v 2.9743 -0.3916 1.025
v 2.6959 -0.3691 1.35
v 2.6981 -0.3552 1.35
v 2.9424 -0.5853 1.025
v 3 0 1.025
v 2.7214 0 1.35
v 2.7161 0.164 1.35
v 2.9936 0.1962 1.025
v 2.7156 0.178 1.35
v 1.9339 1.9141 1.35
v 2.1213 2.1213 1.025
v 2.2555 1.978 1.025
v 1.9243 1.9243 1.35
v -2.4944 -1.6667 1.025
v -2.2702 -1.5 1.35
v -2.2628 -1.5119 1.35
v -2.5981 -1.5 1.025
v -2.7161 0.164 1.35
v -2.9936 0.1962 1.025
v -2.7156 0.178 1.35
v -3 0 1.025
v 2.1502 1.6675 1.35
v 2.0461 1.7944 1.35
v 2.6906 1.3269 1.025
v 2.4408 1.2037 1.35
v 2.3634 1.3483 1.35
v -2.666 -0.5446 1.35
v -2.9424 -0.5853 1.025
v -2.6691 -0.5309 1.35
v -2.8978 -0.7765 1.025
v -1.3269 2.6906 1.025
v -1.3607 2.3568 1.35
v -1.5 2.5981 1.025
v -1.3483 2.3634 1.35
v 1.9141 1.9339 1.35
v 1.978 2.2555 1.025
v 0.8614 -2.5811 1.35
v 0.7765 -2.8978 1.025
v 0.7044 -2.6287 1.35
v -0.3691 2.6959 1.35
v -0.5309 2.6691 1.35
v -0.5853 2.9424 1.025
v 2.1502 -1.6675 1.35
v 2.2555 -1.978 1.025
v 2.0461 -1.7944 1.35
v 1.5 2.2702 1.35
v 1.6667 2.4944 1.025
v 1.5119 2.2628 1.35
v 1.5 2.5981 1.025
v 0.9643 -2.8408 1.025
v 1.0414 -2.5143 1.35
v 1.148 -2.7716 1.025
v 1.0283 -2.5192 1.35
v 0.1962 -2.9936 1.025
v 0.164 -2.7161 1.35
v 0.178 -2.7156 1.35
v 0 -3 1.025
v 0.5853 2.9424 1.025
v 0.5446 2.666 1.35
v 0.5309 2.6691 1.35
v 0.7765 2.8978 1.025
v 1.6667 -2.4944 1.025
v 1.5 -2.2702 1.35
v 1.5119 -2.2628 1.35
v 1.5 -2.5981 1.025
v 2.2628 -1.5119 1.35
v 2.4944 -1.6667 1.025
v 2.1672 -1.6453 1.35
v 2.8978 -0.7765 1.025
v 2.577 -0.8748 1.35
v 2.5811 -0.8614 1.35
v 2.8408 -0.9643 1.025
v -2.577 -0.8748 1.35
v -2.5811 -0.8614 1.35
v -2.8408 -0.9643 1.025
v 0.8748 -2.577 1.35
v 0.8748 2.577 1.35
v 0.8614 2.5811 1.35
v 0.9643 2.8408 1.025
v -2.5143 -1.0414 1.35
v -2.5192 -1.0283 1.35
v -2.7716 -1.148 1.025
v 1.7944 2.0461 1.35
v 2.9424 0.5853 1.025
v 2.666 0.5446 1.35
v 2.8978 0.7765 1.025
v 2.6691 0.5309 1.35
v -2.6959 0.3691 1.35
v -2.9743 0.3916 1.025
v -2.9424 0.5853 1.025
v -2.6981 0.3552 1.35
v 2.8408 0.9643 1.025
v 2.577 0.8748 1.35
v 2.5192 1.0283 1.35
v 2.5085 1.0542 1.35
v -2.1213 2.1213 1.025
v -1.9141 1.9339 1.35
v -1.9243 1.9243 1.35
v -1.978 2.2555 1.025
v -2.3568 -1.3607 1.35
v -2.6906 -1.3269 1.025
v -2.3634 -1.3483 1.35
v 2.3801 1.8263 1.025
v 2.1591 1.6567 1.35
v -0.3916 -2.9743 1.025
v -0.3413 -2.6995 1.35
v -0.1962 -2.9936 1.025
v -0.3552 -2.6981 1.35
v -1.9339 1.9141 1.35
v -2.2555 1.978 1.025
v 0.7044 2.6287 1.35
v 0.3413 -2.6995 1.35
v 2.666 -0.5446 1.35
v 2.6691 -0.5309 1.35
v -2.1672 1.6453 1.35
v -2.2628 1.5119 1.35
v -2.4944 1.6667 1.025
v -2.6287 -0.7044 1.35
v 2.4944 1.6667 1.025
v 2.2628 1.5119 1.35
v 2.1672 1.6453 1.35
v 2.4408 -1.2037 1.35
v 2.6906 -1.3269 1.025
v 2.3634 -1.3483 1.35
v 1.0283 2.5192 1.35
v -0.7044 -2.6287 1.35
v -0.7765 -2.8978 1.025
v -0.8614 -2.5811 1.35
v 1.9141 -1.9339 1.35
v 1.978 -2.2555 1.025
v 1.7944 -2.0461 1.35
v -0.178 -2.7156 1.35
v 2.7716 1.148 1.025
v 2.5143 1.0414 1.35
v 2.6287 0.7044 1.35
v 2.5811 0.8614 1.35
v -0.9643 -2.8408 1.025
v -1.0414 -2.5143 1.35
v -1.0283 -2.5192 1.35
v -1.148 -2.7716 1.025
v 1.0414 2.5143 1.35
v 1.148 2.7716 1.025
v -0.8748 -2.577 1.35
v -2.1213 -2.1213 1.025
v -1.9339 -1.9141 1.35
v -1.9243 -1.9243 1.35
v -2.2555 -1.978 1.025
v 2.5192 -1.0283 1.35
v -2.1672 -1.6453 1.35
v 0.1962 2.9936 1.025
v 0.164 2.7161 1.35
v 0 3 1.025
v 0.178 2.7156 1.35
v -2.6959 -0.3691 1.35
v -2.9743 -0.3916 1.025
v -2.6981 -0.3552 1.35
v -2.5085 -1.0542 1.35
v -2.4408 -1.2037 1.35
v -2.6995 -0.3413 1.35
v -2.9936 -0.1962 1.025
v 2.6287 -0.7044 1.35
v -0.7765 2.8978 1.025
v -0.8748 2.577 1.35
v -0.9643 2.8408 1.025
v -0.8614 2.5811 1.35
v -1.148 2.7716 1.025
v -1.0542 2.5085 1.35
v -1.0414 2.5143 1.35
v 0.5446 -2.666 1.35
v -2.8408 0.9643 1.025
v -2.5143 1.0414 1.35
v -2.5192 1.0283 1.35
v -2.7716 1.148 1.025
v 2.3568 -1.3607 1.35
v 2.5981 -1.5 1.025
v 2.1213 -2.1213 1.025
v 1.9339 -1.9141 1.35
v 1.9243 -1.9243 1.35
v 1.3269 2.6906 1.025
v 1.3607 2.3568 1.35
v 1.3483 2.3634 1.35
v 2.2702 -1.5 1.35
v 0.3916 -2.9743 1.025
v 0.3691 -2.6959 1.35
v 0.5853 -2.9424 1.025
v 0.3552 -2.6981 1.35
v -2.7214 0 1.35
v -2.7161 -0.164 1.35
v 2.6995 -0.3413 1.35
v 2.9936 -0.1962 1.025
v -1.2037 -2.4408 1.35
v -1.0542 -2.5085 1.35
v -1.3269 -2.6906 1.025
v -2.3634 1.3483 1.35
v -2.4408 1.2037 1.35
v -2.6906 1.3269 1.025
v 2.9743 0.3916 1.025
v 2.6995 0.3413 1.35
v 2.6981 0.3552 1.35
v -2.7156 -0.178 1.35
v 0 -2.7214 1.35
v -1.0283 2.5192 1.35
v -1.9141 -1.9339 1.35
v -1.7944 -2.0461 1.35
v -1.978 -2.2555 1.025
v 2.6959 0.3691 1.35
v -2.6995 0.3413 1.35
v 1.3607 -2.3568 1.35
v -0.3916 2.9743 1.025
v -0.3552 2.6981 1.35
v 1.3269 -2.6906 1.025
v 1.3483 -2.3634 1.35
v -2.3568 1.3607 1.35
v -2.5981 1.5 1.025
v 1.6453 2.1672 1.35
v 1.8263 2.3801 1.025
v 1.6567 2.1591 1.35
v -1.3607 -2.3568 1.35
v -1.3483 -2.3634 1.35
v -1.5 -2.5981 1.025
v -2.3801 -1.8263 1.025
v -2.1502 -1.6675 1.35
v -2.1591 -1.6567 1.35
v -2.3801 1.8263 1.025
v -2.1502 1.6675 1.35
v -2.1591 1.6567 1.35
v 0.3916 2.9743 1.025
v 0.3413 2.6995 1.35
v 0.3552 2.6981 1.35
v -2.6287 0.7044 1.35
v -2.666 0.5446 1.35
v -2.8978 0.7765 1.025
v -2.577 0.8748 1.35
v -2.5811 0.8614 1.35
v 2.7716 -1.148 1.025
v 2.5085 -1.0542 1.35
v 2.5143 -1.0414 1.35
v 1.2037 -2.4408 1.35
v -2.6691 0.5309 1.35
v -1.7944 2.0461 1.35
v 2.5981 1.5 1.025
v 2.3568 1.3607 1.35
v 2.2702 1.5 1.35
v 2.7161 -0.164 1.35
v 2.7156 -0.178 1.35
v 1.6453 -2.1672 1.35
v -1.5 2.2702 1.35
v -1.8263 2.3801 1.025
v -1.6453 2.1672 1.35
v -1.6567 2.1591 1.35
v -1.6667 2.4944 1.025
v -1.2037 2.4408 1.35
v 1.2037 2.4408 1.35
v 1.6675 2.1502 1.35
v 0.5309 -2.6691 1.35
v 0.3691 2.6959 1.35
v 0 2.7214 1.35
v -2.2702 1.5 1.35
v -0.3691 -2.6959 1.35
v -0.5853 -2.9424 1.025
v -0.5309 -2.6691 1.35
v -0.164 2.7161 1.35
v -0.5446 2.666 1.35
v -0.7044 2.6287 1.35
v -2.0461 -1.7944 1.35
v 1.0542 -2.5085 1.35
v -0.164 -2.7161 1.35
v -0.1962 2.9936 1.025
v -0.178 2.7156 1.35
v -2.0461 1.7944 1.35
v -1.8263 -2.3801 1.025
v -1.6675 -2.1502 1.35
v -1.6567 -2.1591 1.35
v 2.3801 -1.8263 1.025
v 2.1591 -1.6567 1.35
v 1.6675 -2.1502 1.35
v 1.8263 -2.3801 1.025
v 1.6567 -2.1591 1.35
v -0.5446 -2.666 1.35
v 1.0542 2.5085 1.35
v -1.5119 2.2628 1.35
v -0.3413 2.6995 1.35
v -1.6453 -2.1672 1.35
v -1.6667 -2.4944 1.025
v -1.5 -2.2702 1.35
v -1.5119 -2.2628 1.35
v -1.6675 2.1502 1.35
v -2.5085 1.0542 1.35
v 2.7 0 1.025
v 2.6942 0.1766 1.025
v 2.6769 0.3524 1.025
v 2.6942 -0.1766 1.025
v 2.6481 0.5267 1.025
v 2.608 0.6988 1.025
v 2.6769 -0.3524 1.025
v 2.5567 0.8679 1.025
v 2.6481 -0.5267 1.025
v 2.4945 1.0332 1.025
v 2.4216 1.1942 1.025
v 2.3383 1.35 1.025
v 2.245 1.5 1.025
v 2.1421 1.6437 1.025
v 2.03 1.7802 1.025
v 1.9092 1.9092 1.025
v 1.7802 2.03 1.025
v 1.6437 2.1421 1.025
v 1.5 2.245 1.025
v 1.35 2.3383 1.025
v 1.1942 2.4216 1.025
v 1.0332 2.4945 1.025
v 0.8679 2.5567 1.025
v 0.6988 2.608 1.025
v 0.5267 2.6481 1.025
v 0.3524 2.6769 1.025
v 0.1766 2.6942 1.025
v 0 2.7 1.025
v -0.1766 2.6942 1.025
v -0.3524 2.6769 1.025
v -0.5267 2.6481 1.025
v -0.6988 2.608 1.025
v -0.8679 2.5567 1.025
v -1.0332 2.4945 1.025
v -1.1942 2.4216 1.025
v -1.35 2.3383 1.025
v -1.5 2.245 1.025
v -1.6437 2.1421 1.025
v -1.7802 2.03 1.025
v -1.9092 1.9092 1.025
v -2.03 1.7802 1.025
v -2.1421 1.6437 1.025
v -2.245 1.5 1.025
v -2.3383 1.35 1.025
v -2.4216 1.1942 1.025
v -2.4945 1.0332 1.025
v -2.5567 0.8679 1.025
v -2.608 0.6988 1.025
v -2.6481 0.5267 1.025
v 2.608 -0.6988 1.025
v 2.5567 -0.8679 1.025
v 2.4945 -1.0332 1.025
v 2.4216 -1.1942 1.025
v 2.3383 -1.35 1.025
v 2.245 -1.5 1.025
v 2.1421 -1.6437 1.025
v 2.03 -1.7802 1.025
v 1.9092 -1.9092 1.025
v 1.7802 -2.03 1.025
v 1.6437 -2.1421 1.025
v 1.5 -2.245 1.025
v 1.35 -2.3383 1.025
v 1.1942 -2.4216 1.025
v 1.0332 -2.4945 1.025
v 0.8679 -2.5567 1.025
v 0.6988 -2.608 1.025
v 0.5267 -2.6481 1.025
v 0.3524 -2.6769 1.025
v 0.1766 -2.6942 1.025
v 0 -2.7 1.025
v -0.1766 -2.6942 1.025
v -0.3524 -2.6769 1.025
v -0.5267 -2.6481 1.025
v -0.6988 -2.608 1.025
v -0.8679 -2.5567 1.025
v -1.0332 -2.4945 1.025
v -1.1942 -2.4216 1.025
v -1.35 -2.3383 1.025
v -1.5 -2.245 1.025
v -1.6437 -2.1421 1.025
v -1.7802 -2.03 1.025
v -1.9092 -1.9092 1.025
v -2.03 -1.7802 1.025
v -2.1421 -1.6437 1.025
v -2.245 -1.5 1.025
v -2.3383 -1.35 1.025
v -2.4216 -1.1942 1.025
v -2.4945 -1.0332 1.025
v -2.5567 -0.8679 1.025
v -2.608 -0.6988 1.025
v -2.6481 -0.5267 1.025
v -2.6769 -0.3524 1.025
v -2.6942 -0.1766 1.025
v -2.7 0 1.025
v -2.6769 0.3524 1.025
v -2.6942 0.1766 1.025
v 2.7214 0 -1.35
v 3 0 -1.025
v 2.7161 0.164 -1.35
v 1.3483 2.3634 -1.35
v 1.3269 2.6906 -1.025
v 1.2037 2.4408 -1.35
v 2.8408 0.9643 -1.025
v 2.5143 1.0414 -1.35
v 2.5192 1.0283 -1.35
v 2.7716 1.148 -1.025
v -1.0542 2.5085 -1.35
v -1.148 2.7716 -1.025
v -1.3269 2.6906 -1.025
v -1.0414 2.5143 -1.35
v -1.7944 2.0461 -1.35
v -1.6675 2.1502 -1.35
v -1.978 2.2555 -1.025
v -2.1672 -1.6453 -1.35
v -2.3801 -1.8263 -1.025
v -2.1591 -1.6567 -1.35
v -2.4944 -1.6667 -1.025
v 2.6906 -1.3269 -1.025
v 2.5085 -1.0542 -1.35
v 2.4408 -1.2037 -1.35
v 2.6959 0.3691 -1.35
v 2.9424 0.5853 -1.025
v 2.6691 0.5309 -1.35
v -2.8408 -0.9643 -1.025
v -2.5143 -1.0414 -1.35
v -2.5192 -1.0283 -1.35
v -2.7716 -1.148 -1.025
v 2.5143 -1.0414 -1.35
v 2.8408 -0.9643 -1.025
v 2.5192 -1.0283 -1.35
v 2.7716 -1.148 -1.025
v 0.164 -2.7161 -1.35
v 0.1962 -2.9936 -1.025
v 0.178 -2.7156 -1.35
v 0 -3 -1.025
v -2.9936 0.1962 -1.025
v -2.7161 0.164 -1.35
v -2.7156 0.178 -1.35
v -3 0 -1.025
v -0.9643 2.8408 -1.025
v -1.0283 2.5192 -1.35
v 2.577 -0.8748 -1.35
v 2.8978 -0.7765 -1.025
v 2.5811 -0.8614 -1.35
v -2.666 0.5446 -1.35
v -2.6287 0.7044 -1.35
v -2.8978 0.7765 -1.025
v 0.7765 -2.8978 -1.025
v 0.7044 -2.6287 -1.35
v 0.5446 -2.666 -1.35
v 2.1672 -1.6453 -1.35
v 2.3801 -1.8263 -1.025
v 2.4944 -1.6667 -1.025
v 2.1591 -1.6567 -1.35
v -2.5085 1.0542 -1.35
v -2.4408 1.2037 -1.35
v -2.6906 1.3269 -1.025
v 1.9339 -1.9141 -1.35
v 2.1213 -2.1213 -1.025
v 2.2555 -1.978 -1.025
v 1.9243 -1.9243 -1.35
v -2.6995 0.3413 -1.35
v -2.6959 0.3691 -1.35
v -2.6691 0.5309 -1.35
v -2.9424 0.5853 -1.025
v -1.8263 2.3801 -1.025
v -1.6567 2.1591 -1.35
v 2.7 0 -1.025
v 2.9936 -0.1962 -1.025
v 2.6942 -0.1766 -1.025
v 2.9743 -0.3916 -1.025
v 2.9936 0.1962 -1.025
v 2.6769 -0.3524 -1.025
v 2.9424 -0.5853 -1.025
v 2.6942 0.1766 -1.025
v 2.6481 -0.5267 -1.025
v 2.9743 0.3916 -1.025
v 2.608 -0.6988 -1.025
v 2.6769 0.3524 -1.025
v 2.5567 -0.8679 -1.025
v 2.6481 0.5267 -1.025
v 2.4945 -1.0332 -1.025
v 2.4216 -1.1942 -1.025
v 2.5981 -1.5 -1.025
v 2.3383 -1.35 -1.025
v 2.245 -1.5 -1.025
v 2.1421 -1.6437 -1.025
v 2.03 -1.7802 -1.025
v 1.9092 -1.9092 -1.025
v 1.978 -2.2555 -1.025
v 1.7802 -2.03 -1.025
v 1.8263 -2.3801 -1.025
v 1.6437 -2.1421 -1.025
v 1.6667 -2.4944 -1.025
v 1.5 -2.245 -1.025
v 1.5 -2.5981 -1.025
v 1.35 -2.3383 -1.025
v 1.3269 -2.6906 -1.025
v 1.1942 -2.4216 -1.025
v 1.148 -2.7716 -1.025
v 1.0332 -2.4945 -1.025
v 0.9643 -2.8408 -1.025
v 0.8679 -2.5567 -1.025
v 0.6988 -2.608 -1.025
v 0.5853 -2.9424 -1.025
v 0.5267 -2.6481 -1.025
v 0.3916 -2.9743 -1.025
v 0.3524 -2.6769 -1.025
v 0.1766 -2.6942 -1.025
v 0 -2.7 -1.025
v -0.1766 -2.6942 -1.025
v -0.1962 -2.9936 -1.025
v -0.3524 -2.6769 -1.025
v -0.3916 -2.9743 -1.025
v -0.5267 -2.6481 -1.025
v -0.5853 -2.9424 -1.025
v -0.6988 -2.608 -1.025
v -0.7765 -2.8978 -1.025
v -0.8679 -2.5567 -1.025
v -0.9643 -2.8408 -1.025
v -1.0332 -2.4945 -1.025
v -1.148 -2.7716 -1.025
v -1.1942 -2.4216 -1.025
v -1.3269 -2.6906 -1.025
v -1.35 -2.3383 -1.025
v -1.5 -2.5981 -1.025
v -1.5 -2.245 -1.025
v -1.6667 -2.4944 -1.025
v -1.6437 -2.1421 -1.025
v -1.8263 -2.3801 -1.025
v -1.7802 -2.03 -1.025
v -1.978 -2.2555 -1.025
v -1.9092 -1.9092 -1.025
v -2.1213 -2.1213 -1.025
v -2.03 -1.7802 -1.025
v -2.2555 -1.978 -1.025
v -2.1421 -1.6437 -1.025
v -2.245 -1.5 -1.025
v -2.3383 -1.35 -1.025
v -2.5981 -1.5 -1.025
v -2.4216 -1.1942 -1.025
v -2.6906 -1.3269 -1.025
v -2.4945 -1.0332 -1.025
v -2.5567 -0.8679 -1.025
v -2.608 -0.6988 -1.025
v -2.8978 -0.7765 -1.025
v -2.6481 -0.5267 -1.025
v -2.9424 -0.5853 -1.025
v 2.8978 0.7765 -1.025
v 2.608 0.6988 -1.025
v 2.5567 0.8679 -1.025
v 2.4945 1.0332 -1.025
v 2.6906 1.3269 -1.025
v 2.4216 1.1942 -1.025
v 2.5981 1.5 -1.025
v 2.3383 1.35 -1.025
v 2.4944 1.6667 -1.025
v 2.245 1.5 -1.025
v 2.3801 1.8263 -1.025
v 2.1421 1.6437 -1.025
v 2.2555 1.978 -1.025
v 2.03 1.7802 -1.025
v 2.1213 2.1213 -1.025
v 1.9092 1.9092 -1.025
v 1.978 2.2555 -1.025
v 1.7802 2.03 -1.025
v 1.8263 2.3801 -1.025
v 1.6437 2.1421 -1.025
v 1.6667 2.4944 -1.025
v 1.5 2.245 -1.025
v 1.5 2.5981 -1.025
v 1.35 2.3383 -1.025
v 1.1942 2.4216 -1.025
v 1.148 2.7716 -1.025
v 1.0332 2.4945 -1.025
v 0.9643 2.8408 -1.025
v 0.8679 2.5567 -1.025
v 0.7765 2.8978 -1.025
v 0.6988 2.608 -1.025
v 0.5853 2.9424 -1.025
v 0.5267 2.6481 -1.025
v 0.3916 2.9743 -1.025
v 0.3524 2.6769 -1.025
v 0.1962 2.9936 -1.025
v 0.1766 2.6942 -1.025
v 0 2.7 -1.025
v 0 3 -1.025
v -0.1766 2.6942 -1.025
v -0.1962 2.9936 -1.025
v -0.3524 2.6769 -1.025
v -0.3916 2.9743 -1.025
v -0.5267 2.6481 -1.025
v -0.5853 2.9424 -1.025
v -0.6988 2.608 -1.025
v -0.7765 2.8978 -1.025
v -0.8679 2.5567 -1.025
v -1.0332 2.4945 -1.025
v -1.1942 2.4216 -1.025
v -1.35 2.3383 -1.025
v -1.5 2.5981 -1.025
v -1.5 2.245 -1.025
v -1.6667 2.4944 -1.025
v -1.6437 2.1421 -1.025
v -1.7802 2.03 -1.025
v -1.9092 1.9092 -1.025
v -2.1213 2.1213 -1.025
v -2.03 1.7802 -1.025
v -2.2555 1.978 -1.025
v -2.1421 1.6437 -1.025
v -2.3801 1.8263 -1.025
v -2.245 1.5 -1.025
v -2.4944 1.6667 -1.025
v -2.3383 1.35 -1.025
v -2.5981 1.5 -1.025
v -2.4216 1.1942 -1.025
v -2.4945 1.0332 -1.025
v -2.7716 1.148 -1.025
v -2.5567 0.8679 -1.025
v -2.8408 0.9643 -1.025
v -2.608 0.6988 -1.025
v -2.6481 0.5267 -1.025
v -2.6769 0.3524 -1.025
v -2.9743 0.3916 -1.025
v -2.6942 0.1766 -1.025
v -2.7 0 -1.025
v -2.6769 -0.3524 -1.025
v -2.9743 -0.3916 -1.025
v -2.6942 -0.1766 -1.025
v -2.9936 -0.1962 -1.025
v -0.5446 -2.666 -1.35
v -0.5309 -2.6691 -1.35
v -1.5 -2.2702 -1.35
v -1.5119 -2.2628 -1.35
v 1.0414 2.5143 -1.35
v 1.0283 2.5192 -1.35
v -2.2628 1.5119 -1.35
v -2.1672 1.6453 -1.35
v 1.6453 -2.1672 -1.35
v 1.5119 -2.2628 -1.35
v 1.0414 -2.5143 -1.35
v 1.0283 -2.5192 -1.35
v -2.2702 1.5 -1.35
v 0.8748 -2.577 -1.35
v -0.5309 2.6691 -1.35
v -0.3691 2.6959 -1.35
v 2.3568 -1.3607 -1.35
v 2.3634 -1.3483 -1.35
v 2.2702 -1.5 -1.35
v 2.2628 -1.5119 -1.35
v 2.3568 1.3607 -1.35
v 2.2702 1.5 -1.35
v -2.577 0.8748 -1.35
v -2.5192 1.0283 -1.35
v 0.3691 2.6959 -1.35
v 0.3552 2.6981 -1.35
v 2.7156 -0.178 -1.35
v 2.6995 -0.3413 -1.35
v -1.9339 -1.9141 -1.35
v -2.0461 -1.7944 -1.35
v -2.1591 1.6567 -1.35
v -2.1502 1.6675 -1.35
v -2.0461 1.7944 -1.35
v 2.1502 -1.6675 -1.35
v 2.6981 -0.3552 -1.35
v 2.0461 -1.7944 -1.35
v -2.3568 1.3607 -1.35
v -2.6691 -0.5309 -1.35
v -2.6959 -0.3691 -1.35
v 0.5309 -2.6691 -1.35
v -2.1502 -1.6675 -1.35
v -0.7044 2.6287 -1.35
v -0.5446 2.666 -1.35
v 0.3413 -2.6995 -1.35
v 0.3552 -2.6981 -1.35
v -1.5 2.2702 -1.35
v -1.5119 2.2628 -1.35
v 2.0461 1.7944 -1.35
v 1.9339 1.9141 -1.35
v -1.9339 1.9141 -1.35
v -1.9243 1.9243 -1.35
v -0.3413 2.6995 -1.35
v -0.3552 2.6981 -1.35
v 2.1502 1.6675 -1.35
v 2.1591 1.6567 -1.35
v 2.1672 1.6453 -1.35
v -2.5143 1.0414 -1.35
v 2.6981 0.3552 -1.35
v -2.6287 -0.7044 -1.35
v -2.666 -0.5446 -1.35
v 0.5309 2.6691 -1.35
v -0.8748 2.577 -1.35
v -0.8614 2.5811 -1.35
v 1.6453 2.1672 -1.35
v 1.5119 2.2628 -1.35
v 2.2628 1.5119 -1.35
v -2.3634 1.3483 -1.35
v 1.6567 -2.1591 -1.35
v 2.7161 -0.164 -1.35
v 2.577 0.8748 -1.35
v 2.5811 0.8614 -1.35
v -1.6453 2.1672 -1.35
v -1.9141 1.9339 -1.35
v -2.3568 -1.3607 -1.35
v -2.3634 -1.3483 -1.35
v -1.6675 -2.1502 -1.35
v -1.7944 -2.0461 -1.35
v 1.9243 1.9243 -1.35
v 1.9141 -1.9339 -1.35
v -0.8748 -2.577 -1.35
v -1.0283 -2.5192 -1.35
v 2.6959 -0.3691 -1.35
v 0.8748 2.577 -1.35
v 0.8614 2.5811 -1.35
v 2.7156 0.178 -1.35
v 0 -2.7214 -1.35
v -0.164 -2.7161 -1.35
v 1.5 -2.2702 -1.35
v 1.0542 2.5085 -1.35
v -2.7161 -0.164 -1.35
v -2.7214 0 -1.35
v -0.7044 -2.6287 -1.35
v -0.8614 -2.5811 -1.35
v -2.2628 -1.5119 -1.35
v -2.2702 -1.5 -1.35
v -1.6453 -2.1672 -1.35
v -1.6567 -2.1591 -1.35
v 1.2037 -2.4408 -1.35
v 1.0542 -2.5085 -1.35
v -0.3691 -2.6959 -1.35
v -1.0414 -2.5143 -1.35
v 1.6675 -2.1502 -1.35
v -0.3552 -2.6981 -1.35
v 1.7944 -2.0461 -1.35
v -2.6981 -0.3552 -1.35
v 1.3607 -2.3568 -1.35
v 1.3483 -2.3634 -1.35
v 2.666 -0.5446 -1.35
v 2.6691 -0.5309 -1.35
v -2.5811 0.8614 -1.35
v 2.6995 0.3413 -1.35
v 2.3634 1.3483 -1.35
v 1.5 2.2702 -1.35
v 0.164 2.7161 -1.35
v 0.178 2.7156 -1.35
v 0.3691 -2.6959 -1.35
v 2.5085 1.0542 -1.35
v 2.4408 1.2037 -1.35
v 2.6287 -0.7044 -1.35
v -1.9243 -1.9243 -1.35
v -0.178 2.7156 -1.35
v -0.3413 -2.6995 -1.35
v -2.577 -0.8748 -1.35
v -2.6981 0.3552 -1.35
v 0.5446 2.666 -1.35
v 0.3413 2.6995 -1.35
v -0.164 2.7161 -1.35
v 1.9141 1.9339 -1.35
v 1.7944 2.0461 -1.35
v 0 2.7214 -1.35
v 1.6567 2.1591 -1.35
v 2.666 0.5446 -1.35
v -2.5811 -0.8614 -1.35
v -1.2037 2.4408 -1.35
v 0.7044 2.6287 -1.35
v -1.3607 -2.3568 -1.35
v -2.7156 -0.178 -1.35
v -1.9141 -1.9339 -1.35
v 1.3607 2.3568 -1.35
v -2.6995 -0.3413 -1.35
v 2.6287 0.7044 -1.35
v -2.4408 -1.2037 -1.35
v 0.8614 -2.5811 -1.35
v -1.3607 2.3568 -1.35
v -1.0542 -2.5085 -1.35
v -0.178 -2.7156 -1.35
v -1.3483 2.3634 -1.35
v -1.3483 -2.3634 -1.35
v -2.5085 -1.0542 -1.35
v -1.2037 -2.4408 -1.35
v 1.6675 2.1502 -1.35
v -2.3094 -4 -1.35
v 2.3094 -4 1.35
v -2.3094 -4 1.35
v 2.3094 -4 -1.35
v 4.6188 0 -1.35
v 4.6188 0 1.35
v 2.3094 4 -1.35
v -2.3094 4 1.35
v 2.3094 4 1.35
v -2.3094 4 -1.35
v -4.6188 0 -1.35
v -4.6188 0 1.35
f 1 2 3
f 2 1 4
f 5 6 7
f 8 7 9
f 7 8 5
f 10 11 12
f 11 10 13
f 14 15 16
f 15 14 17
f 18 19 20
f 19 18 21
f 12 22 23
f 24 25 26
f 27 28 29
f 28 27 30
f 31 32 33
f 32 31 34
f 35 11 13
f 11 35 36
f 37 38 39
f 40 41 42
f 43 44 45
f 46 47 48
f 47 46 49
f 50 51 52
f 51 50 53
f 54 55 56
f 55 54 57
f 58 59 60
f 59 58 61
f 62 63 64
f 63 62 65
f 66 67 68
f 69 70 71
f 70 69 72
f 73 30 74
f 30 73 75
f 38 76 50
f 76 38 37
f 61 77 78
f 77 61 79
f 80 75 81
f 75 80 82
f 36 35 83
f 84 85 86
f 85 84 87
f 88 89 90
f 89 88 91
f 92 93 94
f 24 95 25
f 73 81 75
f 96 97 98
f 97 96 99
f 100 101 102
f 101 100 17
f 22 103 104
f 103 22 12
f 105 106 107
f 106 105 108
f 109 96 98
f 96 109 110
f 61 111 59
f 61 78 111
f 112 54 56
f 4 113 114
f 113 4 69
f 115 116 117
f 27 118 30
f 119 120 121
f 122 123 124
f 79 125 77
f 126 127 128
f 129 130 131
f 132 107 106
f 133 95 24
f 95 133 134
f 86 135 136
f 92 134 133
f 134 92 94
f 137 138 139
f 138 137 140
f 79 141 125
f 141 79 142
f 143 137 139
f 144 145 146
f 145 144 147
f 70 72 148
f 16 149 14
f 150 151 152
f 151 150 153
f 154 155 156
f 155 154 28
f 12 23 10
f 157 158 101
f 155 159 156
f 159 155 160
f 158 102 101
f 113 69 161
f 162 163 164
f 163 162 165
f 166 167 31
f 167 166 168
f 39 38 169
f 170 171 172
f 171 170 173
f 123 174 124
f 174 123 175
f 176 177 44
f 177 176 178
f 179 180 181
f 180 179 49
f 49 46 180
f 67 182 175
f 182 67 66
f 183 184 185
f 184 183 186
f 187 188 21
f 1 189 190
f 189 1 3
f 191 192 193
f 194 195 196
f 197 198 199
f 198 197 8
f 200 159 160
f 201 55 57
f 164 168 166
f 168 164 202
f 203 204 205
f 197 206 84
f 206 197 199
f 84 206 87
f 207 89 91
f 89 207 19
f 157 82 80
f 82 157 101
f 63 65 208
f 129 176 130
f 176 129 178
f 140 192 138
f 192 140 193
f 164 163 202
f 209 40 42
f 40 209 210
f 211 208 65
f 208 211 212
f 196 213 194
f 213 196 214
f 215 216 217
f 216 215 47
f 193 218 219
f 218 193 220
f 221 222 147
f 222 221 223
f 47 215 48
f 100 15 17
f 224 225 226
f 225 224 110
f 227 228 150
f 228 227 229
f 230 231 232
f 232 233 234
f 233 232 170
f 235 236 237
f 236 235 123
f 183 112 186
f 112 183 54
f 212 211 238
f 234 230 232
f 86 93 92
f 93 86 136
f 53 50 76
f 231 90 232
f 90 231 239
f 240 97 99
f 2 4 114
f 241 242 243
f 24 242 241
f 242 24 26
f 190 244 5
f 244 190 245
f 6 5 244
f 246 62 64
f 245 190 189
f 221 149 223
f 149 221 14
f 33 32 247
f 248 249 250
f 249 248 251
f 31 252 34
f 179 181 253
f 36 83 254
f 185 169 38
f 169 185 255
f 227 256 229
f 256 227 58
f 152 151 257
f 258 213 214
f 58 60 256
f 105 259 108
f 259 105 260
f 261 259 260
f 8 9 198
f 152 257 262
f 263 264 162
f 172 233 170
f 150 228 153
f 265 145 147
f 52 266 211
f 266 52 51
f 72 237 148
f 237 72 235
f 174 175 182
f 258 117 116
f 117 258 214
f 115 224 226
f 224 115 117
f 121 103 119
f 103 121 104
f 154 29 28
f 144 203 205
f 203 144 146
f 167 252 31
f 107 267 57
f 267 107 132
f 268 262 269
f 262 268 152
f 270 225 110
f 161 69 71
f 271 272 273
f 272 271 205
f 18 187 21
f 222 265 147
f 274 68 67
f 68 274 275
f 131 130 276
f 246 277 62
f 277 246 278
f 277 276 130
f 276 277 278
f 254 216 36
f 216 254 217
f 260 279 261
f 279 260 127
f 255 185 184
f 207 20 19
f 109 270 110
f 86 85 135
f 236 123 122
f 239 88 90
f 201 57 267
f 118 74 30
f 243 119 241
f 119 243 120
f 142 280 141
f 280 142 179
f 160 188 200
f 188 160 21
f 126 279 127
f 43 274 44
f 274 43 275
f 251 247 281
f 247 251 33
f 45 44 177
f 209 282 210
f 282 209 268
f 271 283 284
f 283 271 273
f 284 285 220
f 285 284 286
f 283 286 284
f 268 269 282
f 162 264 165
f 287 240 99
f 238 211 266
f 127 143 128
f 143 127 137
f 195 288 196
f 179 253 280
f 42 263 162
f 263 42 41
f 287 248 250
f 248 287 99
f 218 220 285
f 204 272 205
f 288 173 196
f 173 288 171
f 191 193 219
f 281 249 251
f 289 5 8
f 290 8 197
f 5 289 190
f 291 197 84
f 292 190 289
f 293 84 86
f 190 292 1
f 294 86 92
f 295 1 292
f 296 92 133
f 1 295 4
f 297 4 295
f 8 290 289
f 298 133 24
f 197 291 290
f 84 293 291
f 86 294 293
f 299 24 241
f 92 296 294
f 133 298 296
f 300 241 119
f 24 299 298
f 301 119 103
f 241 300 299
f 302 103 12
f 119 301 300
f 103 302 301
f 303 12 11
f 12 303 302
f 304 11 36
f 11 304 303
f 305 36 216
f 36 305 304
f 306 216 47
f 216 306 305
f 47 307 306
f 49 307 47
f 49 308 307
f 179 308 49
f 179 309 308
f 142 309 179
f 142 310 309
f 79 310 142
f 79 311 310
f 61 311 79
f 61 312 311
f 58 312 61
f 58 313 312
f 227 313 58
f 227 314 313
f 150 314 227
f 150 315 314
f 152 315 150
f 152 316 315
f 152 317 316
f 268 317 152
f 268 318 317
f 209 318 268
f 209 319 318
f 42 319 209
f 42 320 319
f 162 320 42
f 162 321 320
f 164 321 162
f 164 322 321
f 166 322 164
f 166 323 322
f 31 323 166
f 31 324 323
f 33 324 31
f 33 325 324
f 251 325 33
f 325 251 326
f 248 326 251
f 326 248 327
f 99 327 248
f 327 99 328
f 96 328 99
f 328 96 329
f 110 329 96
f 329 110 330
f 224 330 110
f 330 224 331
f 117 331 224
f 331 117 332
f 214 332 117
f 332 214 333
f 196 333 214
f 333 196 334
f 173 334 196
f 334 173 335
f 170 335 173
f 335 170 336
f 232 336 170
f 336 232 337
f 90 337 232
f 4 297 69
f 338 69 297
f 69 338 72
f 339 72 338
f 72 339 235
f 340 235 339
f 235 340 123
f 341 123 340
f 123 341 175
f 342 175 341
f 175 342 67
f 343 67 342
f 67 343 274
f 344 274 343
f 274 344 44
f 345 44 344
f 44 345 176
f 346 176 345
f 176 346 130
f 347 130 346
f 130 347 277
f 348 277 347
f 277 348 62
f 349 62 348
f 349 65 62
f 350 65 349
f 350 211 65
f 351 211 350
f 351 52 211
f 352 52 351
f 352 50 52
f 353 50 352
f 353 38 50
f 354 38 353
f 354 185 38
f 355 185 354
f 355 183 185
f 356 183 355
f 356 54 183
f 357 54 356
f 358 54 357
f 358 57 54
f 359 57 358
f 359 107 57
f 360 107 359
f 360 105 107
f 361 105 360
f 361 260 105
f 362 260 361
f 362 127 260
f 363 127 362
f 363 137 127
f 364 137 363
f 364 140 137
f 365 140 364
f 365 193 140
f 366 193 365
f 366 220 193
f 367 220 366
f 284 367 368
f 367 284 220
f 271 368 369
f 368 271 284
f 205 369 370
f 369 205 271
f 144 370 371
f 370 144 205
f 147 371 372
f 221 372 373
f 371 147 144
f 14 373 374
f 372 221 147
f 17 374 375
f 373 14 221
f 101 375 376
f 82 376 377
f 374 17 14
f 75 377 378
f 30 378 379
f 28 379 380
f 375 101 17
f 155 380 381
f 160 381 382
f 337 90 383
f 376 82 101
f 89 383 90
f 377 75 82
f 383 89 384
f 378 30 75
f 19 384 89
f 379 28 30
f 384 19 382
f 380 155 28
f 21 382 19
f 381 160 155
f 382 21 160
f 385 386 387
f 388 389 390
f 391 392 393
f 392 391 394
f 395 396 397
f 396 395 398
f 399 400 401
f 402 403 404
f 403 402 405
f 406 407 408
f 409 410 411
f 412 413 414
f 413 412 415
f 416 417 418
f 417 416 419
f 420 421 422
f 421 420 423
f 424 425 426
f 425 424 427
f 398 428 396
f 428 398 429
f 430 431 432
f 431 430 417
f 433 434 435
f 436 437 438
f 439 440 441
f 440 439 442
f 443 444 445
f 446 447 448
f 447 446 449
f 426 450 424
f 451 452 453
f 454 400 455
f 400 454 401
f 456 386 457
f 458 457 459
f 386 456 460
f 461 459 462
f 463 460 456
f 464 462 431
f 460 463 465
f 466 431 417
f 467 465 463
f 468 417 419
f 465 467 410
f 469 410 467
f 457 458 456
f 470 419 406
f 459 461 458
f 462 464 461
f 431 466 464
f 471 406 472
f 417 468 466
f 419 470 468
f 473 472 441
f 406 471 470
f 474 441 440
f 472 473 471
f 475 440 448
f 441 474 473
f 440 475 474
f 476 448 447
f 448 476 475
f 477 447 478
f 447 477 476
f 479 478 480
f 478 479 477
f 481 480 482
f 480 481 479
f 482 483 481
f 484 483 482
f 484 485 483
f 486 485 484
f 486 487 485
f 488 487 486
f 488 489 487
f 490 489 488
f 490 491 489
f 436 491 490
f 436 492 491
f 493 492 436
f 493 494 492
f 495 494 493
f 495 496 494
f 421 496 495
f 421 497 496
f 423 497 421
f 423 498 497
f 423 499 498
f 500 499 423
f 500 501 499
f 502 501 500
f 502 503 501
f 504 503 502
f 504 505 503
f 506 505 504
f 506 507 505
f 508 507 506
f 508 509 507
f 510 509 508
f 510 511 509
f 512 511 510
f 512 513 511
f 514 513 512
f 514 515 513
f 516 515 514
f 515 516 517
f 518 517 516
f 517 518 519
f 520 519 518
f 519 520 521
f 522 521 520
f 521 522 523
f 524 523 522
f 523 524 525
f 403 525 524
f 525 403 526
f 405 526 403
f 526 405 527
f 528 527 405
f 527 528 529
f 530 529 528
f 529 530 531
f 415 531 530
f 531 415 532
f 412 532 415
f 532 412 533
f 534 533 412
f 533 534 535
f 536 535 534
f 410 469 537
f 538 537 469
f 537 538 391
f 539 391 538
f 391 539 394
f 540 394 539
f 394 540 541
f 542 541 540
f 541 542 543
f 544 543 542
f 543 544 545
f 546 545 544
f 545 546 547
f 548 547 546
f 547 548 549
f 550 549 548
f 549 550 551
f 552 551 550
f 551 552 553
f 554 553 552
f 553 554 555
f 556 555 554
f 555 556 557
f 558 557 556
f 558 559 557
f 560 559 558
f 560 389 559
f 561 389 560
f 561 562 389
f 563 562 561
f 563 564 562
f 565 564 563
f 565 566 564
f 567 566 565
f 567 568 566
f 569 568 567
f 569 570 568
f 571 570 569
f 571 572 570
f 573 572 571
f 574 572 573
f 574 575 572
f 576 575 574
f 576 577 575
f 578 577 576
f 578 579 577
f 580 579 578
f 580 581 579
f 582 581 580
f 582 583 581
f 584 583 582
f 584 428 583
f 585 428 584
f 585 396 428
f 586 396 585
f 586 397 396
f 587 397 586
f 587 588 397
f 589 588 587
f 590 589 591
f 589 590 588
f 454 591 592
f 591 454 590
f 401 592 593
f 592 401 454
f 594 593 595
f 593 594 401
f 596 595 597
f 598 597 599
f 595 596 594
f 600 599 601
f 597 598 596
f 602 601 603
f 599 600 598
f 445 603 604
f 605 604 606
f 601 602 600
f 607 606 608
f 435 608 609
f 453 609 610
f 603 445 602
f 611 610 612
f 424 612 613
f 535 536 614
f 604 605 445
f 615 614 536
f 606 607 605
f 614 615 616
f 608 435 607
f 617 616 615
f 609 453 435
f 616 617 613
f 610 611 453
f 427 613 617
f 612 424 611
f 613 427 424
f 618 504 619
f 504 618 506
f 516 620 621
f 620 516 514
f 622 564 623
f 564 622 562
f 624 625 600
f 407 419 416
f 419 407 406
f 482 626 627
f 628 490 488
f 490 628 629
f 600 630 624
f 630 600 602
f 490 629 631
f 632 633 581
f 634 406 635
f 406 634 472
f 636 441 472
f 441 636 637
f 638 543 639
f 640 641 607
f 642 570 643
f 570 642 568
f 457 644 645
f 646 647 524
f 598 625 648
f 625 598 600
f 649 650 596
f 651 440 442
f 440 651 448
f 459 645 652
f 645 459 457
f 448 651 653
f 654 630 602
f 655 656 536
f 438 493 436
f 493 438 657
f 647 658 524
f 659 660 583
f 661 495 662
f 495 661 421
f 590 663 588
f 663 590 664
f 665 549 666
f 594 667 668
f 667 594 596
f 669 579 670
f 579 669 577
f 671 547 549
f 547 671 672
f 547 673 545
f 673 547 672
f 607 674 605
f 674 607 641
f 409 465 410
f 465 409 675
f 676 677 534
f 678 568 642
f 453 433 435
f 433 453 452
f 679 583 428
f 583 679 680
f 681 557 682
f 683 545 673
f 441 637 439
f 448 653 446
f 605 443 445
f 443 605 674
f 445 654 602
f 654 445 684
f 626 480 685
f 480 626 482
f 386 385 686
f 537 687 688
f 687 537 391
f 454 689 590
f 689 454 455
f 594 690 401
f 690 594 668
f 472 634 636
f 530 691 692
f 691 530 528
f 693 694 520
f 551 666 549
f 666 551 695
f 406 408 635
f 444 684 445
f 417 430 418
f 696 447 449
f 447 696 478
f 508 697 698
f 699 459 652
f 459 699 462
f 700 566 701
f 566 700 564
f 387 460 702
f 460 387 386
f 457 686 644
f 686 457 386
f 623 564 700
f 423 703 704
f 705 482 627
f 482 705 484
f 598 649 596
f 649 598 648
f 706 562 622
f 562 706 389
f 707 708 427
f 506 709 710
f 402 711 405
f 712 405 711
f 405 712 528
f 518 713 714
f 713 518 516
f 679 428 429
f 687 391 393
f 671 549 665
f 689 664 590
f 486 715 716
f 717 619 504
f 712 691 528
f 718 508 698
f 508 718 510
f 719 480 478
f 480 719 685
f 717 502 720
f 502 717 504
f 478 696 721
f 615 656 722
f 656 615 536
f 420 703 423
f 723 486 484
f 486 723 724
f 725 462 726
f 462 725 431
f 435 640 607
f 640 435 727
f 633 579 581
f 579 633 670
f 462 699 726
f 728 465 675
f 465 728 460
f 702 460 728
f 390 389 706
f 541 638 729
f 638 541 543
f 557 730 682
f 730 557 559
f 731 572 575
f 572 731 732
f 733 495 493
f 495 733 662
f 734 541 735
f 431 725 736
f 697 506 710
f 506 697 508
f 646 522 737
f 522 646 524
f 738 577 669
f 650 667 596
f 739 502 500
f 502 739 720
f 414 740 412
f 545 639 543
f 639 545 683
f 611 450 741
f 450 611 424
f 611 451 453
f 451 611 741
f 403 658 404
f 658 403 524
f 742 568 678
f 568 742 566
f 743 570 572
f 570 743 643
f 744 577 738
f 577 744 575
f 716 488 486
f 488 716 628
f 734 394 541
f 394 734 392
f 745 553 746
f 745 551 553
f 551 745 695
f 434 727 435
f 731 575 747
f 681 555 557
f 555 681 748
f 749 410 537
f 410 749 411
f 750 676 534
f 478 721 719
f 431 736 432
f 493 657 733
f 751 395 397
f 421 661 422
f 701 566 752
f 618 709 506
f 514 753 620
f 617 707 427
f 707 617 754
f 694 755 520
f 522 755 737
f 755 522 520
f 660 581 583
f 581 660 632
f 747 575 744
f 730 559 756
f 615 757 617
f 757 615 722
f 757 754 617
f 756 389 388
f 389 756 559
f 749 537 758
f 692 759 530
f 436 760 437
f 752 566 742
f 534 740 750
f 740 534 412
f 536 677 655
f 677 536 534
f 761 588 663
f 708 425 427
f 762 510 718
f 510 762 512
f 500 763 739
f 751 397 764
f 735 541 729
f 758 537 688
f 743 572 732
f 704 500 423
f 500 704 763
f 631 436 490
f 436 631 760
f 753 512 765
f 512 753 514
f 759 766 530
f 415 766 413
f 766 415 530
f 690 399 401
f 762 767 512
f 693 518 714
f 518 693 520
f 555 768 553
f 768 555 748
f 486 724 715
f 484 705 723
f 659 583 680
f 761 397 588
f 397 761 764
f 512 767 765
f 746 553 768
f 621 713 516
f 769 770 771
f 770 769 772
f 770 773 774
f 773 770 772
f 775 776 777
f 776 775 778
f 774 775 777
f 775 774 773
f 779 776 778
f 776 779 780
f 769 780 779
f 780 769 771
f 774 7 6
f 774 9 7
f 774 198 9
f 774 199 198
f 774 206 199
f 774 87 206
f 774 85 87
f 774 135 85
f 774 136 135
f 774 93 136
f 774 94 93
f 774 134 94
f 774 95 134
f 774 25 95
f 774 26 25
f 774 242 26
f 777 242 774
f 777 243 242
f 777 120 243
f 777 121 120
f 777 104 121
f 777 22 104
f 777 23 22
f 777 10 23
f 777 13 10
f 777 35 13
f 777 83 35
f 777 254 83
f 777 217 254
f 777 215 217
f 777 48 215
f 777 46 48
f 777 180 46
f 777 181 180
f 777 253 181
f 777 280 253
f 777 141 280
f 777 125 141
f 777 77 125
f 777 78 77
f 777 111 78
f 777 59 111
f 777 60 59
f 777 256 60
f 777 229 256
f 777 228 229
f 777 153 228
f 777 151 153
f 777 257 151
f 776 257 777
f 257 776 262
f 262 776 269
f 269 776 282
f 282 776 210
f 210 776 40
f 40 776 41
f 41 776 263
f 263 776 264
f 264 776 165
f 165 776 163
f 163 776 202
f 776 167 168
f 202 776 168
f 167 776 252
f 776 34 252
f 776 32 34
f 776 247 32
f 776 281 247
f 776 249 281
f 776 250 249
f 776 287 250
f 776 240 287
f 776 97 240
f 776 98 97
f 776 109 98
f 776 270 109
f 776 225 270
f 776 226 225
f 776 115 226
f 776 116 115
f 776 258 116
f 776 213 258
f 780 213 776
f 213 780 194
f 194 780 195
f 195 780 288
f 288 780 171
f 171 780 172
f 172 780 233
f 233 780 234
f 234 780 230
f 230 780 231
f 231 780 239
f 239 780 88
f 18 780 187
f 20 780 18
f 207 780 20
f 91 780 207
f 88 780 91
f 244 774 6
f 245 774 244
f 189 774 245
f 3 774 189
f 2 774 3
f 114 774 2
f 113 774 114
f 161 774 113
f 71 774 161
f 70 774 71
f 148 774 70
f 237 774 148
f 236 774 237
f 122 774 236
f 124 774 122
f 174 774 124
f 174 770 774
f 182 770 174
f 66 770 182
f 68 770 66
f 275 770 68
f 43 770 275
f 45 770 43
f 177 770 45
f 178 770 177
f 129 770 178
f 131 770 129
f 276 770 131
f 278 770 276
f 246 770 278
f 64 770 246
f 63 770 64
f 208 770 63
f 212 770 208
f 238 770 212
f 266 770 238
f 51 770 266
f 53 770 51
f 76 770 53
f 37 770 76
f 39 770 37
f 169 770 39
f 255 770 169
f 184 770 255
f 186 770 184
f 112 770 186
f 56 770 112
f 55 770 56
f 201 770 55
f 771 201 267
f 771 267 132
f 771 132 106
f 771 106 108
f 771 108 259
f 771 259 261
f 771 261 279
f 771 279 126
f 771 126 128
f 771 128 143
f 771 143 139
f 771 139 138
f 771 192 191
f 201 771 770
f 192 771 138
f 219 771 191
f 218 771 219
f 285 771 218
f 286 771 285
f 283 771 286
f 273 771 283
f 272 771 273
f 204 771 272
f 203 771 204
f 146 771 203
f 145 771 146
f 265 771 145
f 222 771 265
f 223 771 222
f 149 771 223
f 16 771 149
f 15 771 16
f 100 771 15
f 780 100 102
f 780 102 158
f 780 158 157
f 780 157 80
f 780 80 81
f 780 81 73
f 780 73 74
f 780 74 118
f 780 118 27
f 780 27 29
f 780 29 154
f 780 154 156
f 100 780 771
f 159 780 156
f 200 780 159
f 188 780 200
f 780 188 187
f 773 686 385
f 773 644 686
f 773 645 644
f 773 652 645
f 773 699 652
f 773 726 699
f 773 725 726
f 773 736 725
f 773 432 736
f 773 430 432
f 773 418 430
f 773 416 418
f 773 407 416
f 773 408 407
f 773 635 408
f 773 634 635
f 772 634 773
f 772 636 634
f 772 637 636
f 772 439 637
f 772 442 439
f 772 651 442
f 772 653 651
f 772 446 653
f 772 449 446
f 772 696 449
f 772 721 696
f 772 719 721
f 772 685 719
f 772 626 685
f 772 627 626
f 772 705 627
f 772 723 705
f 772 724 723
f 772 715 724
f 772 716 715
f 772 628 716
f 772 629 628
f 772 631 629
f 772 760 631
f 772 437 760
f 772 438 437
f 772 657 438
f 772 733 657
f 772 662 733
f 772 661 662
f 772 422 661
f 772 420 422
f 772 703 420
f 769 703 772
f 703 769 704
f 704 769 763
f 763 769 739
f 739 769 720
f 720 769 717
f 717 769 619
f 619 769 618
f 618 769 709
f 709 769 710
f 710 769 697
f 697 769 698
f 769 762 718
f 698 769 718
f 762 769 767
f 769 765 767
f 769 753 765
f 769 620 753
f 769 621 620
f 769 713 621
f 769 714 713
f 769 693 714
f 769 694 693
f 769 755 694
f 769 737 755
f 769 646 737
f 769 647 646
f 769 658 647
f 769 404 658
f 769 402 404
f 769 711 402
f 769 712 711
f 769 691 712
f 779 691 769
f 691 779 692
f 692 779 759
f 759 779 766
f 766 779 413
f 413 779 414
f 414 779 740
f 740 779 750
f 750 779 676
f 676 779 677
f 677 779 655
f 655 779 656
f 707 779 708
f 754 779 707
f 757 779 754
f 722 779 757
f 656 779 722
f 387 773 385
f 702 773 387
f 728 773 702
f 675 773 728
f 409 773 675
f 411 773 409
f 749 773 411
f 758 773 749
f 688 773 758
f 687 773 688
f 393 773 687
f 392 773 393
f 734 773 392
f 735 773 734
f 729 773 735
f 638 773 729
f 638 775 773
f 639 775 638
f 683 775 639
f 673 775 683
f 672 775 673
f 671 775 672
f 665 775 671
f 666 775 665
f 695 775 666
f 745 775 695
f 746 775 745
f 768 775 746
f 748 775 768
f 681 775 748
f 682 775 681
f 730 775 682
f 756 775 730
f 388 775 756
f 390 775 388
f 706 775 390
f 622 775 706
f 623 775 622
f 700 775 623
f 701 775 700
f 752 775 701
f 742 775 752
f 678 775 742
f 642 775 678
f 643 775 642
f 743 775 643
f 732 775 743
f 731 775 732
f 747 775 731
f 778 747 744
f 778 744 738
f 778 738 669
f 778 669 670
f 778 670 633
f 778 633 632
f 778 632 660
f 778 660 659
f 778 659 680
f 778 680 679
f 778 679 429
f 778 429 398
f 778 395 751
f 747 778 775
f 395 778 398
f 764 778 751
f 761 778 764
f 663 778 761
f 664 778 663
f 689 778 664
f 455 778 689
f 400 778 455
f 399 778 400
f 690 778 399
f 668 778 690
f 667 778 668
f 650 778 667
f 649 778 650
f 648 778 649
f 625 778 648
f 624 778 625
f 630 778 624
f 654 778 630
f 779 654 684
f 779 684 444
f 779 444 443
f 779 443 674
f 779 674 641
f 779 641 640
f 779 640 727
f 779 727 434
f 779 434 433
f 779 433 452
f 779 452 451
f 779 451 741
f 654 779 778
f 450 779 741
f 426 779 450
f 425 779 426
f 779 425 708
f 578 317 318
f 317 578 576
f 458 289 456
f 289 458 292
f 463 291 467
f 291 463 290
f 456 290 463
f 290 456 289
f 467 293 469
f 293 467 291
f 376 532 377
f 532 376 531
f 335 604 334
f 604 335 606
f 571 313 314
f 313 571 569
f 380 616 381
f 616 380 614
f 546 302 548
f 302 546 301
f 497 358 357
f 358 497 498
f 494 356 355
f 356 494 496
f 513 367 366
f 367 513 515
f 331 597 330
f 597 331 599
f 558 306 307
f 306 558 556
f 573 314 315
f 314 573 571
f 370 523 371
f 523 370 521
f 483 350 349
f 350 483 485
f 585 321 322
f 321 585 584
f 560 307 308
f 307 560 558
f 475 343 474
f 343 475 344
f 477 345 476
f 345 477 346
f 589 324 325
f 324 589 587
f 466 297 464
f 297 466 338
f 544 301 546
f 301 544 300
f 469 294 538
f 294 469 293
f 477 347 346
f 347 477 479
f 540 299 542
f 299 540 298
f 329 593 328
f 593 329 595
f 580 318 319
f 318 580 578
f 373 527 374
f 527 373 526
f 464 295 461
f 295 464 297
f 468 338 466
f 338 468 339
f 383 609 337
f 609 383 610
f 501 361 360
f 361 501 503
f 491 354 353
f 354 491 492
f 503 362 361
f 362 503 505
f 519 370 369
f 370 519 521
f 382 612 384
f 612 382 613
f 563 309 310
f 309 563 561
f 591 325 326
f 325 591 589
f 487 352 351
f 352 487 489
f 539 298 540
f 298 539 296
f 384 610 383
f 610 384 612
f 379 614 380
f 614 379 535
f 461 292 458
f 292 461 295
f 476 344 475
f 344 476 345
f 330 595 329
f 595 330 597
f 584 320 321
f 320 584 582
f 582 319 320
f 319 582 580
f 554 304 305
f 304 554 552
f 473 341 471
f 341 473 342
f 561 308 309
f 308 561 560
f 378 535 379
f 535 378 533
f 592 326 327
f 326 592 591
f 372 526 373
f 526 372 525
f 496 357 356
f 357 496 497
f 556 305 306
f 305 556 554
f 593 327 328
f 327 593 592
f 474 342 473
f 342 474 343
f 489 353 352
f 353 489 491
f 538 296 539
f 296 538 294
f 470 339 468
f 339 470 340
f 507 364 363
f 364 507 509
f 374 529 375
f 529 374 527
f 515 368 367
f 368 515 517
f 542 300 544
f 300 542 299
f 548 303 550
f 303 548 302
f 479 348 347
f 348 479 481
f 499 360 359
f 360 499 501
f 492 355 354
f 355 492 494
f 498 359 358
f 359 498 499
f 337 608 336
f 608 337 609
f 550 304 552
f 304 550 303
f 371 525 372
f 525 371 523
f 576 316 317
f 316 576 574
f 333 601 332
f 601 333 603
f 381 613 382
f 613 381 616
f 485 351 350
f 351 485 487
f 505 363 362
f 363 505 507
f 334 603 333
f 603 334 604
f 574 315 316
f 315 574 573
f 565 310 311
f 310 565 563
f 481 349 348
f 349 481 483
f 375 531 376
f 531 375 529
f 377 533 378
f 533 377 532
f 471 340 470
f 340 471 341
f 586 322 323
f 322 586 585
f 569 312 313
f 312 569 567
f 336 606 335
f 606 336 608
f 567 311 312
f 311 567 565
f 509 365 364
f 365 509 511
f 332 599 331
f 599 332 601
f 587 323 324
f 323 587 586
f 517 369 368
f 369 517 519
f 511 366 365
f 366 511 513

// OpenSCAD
// Thin hex nut for 5.0mm screws, 8.0mm across flats, 2.7mm thick

thread_nominal_diameter_mm = 5.0;   //[2.5:10.0:0.1]
across_flats_mm            = 8.0;   //[6.0:16.0:0.1]
thickness_mm               = 2.7;   //[1.5:6.0:0.1]

// Hole: 0 = clearance, 1 = tap-drill (thread representation)
hole_type                  = 0;     //[0:1:1]
clearance_add_mm           = 0.4;   //[0.0:1.0:0.05]
tap_drill_factor           = 0.85;  //[0.7:0.95:0.01]

// Edge break (optional)
chamfer_mm                 = 0.3;   //[0.0:1.0:0.05]

// Robust boolean epsilon
eps_mm                     = 0.05;  //[0.01:0.2:0.01]

function hole_d_mm() =
    (hole_type == 1)
        ? (thread_nominal_diameter_mm * tap_drill_factor)
        : (thread_nominal_diameter_mm + clearance_add_mm);

module thin_hex_nut() {
    // Hex radius from across-flats: AF = 2 * r * cos(30)
    hex_r = across_flats_mm / (2 * cos(30));
    hole_r = hole_d_mm() / 2;

    difference() {
        // Hex body only (no washer/flange)
        cylinder(r = hex_r, h = thickness_mm, center = true, $fn = 6);

        // Circular hole (high $fn to avoid polygonal look)
        cylinder(r = hole_r, h = thickness_mm + 2*eps_mm, center = true, $fn = 96);

        // Small chamfer/edge break at hole (kept within thickness)
        if (chamfer_mm > 0) {
            chamfer_h = min(chamfer_mm, thickness_mm/2);

            translate([0, 0,  thickness_mm/2 - chamfer_h/2])
                cylinder(r1 = hole_r + chamfer_h, r2 = hole_r,
                         h = chamfer_h + eps_mm, center = true, $fn = 96);

            translate([0, 0, -thickness_mm/2 + chamfer_h/2])
                cylinder(r1 = hole_r, r2 = hole_r + chamfer_h,
                         h = chamfer_h + eps_mm, center = true, $fn = 96);
        }
    }
}

thin_hex_nut();
